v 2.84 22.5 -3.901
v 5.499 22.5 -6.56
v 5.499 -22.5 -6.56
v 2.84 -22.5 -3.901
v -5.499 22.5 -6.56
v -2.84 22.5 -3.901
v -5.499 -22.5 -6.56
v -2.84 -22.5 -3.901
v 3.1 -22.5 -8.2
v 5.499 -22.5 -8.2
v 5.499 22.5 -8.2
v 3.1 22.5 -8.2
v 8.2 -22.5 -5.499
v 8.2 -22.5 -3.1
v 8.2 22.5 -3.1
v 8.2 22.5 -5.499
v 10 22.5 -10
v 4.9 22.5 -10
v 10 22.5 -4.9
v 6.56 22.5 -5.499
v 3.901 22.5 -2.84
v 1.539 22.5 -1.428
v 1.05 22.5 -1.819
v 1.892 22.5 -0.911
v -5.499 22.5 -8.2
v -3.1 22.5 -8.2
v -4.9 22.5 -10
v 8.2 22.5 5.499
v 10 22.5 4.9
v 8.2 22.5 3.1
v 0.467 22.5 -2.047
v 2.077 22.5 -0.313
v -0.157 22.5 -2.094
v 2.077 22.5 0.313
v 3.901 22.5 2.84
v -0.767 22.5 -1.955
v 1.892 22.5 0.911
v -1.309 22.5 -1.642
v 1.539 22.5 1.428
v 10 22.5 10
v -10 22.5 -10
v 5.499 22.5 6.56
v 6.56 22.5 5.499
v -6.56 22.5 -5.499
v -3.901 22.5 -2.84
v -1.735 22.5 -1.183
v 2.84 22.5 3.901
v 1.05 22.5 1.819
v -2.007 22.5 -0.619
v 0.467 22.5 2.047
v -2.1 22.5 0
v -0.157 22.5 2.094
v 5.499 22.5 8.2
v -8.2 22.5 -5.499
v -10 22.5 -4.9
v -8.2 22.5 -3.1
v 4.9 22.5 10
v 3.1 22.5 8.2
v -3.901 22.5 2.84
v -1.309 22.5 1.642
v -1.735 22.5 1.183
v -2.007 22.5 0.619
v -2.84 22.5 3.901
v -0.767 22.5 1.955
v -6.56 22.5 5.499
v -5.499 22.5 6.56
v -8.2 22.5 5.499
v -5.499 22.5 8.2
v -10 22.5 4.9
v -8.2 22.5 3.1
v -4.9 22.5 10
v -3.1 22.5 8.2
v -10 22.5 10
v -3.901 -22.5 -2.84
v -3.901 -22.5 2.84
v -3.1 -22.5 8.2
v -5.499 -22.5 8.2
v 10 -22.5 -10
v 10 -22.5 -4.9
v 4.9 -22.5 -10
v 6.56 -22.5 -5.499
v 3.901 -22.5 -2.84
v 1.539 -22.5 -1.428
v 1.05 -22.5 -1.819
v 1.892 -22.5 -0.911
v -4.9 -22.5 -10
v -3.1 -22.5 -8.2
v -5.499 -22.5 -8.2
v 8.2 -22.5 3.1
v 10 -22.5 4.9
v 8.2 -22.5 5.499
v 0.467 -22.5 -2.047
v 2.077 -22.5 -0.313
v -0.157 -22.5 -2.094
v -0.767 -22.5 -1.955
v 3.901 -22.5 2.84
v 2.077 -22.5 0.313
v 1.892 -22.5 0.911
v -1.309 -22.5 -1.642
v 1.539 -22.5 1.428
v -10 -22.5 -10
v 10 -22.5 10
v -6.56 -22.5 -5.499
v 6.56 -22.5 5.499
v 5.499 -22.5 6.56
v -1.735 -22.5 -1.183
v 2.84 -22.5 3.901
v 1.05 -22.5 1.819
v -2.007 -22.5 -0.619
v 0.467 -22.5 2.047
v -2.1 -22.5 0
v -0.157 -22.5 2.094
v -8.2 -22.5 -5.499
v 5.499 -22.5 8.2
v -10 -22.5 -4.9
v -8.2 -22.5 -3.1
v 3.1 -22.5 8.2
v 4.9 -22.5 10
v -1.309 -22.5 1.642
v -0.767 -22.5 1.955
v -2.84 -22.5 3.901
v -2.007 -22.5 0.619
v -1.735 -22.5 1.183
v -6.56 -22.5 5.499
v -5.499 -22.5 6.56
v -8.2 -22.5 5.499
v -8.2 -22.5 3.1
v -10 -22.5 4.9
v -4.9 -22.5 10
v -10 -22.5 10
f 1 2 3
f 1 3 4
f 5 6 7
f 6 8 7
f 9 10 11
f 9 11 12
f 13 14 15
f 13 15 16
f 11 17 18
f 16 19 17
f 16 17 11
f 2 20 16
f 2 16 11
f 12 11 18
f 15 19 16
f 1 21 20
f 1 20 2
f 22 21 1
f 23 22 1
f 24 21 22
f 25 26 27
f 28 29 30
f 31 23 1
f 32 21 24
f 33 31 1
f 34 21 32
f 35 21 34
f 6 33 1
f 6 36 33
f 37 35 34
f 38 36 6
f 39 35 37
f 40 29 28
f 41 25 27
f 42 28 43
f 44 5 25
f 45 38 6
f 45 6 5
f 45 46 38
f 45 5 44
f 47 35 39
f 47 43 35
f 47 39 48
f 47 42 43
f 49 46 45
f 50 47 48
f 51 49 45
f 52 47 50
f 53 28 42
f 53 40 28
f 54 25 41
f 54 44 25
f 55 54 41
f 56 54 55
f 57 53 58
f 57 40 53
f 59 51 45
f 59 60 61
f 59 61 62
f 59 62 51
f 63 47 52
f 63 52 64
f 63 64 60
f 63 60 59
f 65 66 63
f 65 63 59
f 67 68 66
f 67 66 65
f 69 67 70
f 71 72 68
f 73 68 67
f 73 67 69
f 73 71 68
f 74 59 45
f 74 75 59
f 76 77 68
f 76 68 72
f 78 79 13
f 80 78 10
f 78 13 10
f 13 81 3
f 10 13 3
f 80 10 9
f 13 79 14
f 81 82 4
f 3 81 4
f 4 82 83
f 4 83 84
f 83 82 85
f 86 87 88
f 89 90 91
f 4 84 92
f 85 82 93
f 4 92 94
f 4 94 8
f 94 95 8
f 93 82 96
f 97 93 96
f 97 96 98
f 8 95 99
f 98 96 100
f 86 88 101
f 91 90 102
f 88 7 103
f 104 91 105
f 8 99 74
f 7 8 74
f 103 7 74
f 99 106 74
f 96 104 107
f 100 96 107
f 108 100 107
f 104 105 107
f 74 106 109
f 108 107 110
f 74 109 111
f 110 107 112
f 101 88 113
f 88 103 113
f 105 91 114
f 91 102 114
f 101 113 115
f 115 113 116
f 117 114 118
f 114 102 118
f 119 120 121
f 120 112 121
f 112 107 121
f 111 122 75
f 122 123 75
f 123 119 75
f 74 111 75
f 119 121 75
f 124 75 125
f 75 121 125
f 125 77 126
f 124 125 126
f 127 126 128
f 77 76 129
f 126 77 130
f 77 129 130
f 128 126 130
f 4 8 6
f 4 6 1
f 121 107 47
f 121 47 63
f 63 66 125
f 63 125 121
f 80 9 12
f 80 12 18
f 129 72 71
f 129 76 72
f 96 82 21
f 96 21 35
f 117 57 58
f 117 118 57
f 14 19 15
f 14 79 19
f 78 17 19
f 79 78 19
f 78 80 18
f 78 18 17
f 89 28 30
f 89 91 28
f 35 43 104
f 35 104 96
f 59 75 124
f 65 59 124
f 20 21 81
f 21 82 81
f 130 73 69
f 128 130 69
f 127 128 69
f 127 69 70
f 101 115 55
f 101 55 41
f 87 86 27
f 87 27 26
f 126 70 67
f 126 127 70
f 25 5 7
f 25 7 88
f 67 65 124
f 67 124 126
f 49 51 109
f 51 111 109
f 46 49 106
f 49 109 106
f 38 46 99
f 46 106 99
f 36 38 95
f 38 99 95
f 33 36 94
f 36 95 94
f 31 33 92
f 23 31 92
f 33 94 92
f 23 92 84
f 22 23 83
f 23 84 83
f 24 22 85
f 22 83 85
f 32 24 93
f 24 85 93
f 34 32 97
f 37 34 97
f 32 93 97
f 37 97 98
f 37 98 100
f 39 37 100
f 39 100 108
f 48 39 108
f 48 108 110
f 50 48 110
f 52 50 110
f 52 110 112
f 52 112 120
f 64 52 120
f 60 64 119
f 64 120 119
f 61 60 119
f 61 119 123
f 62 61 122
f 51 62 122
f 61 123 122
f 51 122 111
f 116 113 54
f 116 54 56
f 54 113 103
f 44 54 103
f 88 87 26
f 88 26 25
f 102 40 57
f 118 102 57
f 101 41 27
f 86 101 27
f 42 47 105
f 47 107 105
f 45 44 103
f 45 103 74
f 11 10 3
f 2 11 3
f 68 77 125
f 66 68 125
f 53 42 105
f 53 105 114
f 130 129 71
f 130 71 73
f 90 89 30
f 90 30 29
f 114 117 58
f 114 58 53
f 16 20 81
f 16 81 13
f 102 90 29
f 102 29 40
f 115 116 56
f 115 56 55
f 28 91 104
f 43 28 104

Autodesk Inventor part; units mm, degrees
ref_plane "YZ Plane" through (0, 0, 0) normal (1, 0, 0) x (0, 1, 0)
ref_plane "XZ Plane" through (0, 0, 0) normal (0, 1, 0) x (-1, 0, 0)
ref_plane "XY Plane" through (0, 0, 0) normal (0, 0, 1) x (1, 0, 0)
sketch "Sketch1" plane through (0, 0, 0) normal (0, 1, 0) x (-1, 0, 0)
  circle A0 centre (0, 0) radius 2.1
  line L0 (0, -3.9007) -> (-2.84, -3.9007)
  line L1 (-5.4993, -8.2) -> (-3.1, -8.2)
  line L2 (-3.1, -8.2) -> (-4.9, -10)
  line L3 (-4.9, -10) -> (-10, -10)
  line L4 (-10, -10) -> (-10, -4.9)
  line L5 (-10, -4.9) -> (-8.2, -3.1)
  line L6 (-8.2, -3.1) -> (-8.2, -5.4993)
  line L7 (-3.9007, -2.84) -> (-3.9007, 0)
  line L8 (-3.9007, 0) -> (-2.1, 0)
  line L9 (0, -3.9007) -> (0, -2.1) construction
  line L10 (-5.4993, -8.2) -> (-5.4993, -6.56)
  line L11 (-5.4993, -6.56) -> (-2.84, -3.9007)
  line L12 (-3.9007, -2.84) -> (-6.56, -5.4993)
  line L13 (-6.56, -5.4993) -> (-8.2, -5.4993)
  line L14 (6.56, -5.4993) -> (3.9007, -2.84)
  line L15 (3.1, -8.2) -> (5.4993, -8.2)
  line L16 (5.4993, -6.56) -> (5.4993, -8.2)
  line L17 (8.2, -5.4993) -> (8.2, -3.1)
  line L18 (8.2, -5.4993) -> (6.56, -5.4993)
  line L19 (8.2, -3.1) -> (10, -4.9)
  line L20 (4.9, -10) -> (3.1, -8.2)
  line L21 (10, -4.9) -> (10, -10)
  line L22 (10, -10) -> (4.9, -10)
  line L23 (2.84, -3.9007) -> (0, -3.9007)
  line L24 (0, -3.9007) -> (0, -2.1) construction
  line L25 (3.9007, 0) -> (2.1, 0)
  line L26 (3.9007, 0) -> (3.9007, -2.84)
  line L27 (2.84, -3.9007) -> (5.4993, -6.56)
  line L28 (5.4993, 6.56) -> (2.84, 3.9007)
  line L29 (8.2, 3.1) -> (8.2, 5.4993)
  line L30 (6.56, 5.4993) -> (8.2, 5.4993)
  line L31 (5.4993, 8.2) -> (3.1, 8.2)
  line L32 (5.4993, 8.2) -> (5.4993, 6.56)
  line L33 (3.1, 8.2) -> (4.9, 10)
  line L34 (10, 4.9) -> (8.2, 3.1)
  line L35 (4.9, 10) -> (10, 10)
  line L36 (10, 10) -> (10, 4.9)
  line L37 (3.9007, 2.84) -> (3.9007, 0)
  line L38 (3.9007, 0) -> (2.1, 0) construction
  line L39 (0, 3.9007) -> (0, 2.1)
  line L40 (0, 3.9007) -> (2.84, 3.9007)
  line L41 (3.9007, 2.84) -> (6.56, 5.4993)
  line L42 (-6.56, 5.4993) -> (-3.9007, 2.84)
  line L43 (-3.1, 8.2) -> (-5.4993, 8.2)
  line L44 (-5.4993, 6.56) -> (-5.4993, 8.2)
  line L45 (-8.2, 5.4993) -> (-8.2, 3.1)
  line L46 (-8.2, 5.4993) -> (-6.56, 5.4993)
  line L47 (-8.2, 3.1) -> (-10, 4.9)
  line L48 (-4.9, 10) -> (-3.1, 8.2)
  line L49 (-10, 4.9) -> (-10, 10)
  line L50 (-10, 10) -> (-4.9, 10)
  line L51 (-2.84, 3.9007) -> (0, 3.9007)
  line L52 (0, 3.9007) -> (0, 2.1) construction
  line L53 (-3.9007, 0) -> (-2.1, 0) construction
  line L54 (-3.9007, 0) -> (-3.9007, 2.84)
  line L55 (-2.84, 3.9007) -> (-5.4993, 6.56)
  point P0 (0, -3.0003)
  point P1 (-3.0003, 0)
  point P2 (0, -3.0003)
  point P3 (3.0003, 0)
  point P4 (3.0003, 0)
  point P5 (0, 3.0003)
  point P6 (0, 3.0003)
  point P7 (-3.0003, 0)
  dimension "d0" = 4.2
  dimension "d2" = 45
  dimension "d3" = 3.1
  dimension "d4" = 2.84
  dimension "d7" = 10
  dimension "d8" = 10
  dimension "d9" = 1.5
  dimension "d10" = 1.8
  dimension "d11" = 1.64
  dimension "d14" = 360
extrude "Extrusion1" add sketch "Sketch1" along normal mid plane 45 contours L25 L26 L14 L18 L17 L19 L21 L22 L20 L15 L16 L27 L23 L0 L11 L10 L1 L2 L3 L4 L5 L6 L13 L12 L7 L8 A0 | A0 L39 L40 L28 L32 L31 L33 L35 L36 L34 L29 L30 L41 L37 L25 | A0 L8 L54 L42 L46 L45 L47 L49 L50 L48 L43 L44 L55 L51 L39
properties part number "vslot_45mm" material "Aluminum 6061-AHC"
